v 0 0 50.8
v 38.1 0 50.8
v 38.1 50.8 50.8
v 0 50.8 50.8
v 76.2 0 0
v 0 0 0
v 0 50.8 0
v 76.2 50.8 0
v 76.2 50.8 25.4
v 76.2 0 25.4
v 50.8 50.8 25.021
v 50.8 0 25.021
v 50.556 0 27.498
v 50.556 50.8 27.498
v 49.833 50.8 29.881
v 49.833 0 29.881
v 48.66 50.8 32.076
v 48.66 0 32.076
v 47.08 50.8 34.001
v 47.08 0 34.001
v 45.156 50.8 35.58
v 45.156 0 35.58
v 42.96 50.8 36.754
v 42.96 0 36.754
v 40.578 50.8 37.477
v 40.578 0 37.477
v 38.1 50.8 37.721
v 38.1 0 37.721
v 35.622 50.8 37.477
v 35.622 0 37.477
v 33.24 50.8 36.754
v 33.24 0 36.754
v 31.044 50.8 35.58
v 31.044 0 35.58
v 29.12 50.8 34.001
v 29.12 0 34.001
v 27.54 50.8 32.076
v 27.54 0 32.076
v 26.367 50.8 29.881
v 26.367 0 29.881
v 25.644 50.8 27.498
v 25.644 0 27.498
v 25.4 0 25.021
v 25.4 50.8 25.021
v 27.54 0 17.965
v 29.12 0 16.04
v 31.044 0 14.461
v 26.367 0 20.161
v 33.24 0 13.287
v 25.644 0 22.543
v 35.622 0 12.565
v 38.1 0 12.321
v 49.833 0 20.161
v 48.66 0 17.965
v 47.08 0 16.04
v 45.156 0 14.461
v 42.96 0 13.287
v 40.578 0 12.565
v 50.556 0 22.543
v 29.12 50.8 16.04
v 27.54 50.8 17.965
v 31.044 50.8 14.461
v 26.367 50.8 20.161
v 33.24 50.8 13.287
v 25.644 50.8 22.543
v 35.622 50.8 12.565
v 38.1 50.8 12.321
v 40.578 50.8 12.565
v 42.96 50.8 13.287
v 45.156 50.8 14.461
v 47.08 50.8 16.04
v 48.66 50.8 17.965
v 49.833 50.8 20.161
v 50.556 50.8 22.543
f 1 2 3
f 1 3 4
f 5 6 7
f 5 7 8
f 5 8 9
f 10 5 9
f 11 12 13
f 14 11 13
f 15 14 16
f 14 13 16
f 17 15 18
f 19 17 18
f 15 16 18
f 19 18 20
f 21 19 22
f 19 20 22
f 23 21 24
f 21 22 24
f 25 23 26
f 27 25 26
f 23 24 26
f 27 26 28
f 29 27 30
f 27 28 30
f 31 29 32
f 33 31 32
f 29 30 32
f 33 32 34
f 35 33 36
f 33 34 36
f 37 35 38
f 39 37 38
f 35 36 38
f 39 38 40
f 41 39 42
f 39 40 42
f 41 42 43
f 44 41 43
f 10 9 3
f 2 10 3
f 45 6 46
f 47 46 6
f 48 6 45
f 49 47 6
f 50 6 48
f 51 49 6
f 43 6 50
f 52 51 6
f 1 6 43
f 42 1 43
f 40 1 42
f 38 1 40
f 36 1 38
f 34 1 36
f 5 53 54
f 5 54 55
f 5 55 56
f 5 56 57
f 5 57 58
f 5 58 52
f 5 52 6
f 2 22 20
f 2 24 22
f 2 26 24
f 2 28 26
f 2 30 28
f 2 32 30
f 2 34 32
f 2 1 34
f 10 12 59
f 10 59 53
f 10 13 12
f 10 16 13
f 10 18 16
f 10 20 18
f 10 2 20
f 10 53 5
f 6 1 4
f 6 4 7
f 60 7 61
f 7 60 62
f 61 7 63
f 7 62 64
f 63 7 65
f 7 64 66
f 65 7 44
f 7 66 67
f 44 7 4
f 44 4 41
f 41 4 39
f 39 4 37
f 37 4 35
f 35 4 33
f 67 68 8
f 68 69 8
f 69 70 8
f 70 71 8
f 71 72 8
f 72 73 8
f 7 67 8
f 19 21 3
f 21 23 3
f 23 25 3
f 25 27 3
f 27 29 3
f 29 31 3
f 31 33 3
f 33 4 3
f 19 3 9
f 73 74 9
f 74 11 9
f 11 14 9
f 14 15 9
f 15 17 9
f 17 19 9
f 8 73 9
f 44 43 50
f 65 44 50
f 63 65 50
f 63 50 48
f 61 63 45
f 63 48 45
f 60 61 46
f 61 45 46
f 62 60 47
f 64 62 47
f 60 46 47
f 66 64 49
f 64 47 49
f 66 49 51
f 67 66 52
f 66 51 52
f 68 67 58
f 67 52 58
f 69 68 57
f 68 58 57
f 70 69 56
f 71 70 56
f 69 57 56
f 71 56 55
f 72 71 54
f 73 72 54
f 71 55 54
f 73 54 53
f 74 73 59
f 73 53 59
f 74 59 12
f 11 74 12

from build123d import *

# Parameters (mm, degrees)
F0_R      = 12.7
F1_DEPTH  = 50.8
F1_FACE_R = 12.7
F2_DEPTH  = 50.8


with BuildPart() as f1:
    # F0 (on Front) → F1 (new body)
    with BuildSketch(Plane.XZ):
        Polygon((38.1, 50.8), (0, 50.8), (0, 0), (76.2, 0), (76.2, 25.4), align=None)
        with Locations((38.1, 25.020719)):
            Circle(F0_R, mode=Mode.SUBTRACT)
    extrude(amount=-F1_DEPTH)

    # F1_face (on face) → F2 (join)
    with BuildSketch(Plane(origin=(33.833102, 0, 22.622123), x_dir=(1, 0, 0), z_dir=(0, -1, 0))):
        Polygon((4.266898, 28.177877), (-33.833102, 28.177877), (-33.833102, -22.622123), (42.366898, -22.622123), (42.366898, 2.777877), align=None)
        with Locations((4.266898, 2.398595)):
            Circle(F1_FACE_R, mode=Mode.SUBTRACT)
    extrude(amount=-F2_DEPTH)


solid = f1.part
